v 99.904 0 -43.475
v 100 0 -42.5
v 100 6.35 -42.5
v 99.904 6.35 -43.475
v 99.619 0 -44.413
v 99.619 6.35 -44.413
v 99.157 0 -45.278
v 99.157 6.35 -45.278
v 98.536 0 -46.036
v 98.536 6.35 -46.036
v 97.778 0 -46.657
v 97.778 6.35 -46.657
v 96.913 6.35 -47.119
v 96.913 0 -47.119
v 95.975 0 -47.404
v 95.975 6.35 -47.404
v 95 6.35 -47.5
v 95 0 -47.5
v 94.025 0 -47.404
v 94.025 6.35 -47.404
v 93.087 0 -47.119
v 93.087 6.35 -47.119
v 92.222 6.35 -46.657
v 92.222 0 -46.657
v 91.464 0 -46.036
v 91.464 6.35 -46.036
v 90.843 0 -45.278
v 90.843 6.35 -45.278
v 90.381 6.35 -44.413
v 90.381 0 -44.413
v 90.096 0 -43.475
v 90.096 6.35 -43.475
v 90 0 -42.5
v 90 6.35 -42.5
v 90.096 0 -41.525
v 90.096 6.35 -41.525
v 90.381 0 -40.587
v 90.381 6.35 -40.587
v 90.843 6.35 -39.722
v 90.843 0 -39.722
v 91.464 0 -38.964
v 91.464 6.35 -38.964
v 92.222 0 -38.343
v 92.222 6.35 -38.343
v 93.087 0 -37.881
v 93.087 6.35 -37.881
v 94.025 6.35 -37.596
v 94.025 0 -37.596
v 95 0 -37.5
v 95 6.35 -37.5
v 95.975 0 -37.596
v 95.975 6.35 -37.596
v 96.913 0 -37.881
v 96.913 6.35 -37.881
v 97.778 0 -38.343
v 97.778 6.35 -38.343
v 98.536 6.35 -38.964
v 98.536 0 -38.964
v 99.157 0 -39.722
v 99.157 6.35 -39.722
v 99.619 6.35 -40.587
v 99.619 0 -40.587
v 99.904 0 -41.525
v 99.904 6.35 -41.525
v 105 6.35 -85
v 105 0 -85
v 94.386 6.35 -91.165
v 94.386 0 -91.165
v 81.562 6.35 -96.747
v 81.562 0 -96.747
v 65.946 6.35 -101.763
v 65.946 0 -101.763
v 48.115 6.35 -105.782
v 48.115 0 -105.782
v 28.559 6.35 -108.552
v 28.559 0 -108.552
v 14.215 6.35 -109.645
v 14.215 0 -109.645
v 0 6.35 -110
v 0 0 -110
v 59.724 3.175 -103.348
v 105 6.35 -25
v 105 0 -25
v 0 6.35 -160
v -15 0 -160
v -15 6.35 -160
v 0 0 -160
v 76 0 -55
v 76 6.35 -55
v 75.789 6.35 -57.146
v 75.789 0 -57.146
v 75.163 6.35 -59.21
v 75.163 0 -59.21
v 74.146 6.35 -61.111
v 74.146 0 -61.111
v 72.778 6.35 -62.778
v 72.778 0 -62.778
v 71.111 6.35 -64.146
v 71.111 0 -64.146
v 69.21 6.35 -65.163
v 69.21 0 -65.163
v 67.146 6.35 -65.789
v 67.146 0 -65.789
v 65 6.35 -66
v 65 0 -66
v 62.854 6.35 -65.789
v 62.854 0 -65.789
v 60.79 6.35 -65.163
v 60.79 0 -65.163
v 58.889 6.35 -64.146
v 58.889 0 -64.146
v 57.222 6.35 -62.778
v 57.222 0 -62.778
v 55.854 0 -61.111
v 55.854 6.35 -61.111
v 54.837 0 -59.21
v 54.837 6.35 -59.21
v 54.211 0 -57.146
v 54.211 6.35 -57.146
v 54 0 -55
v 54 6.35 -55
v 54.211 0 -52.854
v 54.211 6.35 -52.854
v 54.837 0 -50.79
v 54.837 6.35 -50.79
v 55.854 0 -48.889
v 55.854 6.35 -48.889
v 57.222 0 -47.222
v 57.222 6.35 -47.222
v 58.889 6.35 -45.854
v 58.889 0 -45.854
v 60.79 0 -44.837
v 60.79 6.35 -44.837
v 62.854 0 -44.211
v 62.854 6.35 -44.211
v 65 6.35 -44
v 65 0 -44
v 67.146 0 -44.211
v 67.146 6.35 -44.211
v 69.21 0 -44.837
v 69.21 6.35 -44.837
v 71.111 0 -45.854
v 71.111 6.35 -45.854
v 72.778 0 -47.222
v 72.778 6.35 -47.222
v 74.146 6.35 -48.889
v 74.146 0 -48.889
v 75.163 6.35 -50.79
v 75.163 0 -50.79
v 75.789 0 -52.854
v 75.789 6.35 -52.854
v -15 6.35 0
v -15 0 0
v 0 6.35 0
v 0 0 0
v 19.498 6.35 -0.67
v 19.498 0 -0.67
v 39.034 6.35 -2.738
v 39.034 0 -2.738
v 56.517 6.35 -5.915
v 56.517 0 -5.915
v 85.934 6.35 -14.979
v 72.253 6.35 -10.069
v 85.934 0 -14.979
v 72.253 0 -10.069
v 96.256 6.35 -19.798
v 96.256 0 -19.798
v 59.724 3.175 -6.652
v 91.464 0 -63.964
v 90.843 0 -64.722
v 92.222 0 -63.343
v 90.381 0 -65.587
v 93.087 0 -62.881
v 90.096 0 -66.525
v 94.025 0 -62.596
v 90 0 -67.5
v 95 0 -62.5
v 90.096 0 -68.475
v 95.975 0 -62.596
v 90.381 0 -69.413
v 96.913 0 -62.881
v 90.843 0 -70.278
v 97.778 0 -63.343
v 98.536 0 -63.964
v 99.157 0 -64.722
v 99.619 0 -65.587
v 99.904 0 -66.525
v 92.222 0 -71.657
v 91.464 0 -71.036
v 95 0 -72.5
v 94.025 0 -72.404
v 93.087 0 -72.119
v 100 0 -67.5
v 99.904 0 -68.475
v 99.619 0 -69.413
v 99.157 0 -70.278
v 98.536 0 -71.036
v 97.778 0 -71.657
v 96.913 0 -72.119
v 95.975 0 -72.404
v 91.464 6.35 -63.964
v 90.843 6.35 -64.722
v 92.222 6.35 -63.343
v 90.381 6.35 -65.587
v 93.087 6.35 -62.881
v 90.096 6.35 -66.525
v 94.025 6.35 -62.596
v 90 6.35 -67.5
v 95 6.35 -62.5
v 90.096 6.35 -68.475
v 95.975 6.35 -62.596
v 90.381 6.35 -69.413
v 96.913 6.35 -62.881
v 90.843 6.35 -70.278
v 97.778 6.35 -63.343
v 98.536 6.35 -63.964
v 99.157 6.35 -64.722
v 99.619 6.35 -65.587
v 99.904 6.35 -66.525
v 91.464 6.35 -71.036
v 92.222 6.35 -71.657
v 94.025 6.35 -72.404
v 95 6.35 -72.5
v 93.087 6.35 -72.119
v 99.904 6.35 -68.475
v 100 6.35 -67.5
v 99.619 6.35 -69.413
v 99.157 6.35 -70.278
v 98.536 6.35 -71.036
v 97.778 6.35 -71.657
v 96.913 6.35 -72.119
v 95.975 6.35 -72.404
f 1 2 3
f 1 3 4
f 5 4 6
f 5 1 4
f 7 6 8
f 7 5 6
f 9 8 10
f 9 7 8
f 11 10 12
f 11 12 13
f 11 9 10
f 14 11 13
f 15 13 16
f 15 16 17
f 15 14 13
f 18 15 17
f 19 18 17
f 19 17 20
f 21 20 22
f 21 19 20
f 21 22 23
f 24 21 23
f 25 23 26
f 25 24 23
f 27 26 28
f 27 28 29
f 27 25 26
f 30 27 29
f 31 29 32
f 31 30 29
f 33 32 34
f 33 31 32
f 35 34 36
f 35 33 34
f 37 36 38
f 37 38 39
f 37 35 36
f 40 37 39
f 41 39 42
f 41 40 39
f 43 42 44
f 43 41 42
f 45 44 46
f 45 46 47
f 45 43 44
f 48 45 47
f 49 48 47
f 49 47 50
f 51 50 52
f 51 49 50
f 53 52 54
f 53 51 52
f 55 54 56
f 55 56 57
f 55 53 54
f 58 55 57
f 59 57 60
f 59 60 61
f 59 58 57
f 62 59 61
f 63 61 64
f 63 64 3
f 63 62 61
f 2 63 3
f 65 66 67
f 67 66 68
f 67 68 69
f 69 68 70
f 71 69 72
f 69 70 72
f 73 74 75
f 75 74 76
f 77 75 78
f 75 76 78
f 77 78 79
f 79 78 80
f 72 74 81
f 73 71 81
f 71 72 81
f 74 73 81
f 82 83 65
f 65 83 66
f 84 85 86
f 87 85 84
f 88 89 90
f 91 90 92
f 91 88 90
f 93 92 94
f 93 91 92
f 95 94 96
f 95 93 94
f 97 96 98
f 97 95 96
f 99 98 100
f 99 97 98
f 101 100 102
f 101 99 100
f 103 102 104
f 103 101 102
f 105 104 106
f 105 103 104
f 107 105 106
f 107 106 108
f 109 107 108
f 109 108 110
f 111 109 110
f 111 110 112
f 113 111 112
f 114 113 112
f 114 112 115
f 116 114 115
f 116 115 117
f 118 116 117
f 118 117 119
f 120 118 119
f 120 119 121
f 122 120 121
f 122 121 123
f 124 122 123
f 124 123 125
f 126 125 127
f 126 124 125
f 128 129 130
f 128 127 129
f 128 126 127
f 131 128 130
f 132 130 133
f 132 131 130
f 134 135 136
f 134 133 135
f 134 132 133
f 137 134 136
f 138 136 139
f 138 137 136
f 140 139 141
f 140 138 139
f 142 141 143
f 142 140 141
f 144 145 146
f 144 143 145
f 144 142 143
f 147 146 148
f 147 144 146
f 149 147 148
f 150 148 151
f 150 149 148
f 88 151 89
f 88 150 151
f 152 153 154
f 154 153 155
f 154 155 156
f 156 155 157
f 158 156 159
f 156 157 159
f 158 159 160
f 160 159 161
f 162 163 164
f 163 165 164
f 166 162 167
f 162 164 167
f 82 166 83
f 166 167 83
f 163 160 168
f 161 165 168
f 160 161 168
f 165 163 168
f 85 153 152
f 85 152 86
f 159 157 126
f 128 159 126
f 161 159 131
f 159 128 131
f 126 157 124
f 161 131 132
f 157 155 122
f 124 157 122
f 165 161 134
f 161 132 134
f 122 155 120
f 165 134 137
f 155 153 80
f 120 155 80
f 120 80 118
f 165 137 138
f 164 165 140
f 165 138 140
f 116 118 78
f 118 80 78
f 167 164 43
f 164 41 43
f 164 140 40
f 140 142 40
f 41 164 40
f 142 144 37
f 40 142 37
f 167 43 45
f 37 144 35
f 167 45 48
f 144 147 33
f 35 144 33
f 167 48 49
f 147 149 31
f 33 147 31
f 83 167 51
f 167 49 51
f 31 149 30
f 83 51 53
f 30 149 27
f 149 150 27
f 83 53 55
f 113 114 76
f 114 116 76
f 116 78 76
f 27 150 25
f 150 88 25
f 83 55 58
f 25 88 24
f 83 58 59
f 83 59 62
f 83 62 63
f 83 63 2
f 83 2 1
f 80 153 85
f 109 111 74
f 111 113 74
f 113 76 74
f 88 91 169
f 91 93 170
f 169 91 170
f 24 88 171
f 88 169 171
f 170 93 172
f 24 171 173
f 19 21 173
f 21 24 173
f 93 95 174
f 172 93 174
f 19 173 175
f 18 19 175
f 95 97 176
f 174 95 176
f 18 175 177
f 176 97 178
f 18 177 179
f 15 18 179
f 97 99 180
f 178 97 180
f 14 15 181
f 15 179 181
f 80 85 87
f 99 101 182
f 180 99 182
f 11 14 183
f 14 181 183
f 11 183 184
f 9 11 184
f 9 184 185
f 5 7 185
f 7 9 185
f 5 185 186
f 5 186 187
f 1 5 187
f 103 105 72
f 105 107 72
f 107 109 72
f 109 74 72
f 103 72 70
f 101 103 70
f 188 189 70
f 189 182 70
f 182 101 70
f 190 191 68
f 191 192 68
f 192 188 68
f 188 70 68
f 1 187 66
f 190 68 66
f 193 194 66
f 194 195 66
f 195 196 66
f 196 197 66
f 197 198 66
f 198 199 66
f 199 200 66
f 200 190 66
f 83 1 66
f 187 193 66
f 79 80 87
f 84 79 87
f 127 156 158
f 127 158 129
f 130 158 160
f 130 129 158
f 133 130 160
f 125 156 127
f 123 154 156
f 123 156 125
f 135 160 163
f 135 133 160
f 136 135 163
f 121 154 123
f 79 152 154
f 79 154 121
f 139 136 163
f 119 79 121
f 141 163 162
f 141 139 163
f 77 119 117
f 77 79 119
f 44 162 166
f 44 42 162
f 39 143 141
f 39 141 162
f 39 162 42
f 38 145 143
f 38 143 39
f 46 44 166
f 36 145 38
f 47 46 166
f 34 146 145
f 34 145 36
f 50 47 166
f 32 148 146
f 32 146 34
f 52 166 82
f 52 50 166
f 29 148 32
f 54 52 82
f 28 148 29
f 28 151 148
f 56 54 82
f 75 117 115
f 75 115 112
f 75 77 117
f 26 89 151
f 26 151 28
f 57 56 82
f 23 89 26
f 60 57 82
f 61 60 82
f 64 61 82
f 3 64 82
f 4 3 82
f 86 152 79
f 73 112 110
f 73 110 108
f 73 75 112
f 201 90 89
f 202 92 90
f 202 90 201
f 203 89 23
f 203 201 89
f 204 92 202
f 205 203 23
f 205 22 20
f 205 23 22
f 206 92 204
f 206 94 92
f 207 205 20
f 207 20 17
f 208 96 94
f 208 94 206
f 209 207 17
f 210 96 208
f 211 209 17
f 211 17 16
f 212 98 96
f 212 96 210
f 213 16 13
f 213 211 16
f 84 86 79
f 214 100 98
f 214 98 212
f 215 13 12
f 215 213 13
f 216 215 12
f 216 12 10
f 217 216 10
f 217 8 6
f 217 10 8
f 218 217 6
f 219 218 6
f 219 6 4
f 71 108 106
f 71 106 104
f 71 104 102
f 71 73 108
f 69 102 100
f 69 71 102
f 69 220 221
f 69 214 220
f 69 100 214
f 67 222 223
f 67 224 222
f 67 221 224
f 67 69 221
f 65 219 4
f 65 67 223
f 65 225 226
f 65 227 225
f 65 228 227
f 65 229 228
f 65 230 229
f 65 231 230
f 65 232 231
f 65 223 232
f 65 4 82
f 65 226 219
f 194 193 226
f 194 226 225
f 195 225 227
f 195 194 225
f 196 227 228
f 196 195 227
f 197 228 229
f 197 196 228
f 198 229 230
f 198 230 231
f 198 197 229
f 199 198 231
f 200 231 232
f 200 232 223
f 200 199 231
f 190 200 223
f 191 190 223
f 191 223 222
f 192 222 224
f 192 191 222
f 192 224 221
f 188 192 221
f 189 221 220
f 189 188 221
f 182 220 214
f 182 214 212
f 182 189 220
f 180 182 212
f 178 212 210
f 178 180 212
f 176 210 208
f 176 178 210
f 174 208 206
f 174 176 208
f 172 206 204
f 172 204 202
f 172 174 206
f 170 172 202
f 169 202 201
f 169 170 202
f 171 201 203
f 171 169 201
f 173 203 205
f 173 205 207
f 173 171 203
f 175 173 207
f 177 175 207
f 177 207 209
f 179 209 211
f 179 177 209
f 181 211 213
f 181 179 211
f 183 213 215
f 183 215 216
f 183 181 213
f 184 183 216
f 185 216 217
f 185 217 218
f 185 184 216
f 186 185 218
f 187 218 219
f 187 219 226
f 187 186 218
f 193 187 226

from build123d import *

# Parameters (mm, degrees)
BOSS_EXTRUDE1_DEPTH = 6.35
SKETCH2_R           = 5
CUT_EXTRUDE1_DEPTH  = 6.35
SKETCH3_R           = 11
CUT_EXTRUDE2_DEPTH  = 7.3500001
SKETCH4_W           = 15
SKETCH4_H           = 110
BOSS_EXTRUDE3_DEPTH = 6.35
SKETCH5_W           = 15
SKETCH5_H           = 50
BOSS_EXTRUDE4_DEPTH = 6.35


with BuildPart() as part:
    # Sketch1 → Boss-Extrude1 (new body)
    with BuildSketch(Plane(origin=(0, 0, 0), x_dir=(1, 0, 0), z_dir=(0, 1, 0))):
        with BuildLine():
            Line((0, 110), (0, 0))
            add(Edge.make_bspline(
                [(0, 0), (67.941176471, 0), (105, 25)],
                knots=[1.570796327, 1.570796327, 1.570796327, 2.564661308, 2.564661308, 2.564661308], degree=2, weights=[1, 0.879049073, 1]))
            Line((105, 25), (105, 85))
            add(Edge.make_bspline(
                [(105, 85), (67.941176471, 110), (0, 110)],
                knots=[3.718523999, 3.718523999, 3.718523999, 4.71238898, 4.71238898, 4.71238898], degree=2, weights=[1, 0.879049073, 1]))
        make_face()
    extrude(amount=BOSS_EXTRUDE1_DEPTH)

    # Sketch2 → Cut-Extrude1 (cut)
    with BuildSketch(Plane(origin=(0, 0, 0), x_dir=(1, 0, 0), z_dir=(0, 1, 0))):
        with Locations((95, 67.5)):
            Circle(SKETCH2_R)
        with Locations((95, 42.5)):
            Circle(SKETCH2_R)
    extrude(amount=CUT_EXTRUDE1_DEPTH, mode=Mode.SUBTRACT)

    # Sketch3 → Cut-Extrude2 (cut, through all)
    with BuildSketch(Plane(origin=(0, 0, 0), x_dir=(1, 0, 0), z_dir=(0, 1, 0))):
        with Locations((65, 55)):
            Circle(SKETCH3_R)
    extrude(amount=CUT_EXTRUDE2_DEPTH, mode=Mode.SUBTRACT)

    # Sketch4 → Boss-Extrude3 (add)
    with BuildSketch(Plane(origin=(0, 0, 0), x_dir=(1, 0, 0), z_dir=(0, 1, 0))):
        with Locations((-7.5, 55)):
            Rectangle(SKETCH4_W, SKETCH4_H)
    extrude(amount=BOSS_EXTRUDE3_DEPTH)

    # Sketch5 → Boss-Extrude4 (add)
    with BuildSketch(Plane(origin=(0, 0, 0), x_dir=(1, 0, 0), z_dir=(0, 1, 0))):
        with Locations((-7.5, 135)):
            Rectangle(SKETCH5_W, SKETCH5_H)
    extrude(amount=BOSS_EXTRUDE4_DEPTH)


solid = part.part
